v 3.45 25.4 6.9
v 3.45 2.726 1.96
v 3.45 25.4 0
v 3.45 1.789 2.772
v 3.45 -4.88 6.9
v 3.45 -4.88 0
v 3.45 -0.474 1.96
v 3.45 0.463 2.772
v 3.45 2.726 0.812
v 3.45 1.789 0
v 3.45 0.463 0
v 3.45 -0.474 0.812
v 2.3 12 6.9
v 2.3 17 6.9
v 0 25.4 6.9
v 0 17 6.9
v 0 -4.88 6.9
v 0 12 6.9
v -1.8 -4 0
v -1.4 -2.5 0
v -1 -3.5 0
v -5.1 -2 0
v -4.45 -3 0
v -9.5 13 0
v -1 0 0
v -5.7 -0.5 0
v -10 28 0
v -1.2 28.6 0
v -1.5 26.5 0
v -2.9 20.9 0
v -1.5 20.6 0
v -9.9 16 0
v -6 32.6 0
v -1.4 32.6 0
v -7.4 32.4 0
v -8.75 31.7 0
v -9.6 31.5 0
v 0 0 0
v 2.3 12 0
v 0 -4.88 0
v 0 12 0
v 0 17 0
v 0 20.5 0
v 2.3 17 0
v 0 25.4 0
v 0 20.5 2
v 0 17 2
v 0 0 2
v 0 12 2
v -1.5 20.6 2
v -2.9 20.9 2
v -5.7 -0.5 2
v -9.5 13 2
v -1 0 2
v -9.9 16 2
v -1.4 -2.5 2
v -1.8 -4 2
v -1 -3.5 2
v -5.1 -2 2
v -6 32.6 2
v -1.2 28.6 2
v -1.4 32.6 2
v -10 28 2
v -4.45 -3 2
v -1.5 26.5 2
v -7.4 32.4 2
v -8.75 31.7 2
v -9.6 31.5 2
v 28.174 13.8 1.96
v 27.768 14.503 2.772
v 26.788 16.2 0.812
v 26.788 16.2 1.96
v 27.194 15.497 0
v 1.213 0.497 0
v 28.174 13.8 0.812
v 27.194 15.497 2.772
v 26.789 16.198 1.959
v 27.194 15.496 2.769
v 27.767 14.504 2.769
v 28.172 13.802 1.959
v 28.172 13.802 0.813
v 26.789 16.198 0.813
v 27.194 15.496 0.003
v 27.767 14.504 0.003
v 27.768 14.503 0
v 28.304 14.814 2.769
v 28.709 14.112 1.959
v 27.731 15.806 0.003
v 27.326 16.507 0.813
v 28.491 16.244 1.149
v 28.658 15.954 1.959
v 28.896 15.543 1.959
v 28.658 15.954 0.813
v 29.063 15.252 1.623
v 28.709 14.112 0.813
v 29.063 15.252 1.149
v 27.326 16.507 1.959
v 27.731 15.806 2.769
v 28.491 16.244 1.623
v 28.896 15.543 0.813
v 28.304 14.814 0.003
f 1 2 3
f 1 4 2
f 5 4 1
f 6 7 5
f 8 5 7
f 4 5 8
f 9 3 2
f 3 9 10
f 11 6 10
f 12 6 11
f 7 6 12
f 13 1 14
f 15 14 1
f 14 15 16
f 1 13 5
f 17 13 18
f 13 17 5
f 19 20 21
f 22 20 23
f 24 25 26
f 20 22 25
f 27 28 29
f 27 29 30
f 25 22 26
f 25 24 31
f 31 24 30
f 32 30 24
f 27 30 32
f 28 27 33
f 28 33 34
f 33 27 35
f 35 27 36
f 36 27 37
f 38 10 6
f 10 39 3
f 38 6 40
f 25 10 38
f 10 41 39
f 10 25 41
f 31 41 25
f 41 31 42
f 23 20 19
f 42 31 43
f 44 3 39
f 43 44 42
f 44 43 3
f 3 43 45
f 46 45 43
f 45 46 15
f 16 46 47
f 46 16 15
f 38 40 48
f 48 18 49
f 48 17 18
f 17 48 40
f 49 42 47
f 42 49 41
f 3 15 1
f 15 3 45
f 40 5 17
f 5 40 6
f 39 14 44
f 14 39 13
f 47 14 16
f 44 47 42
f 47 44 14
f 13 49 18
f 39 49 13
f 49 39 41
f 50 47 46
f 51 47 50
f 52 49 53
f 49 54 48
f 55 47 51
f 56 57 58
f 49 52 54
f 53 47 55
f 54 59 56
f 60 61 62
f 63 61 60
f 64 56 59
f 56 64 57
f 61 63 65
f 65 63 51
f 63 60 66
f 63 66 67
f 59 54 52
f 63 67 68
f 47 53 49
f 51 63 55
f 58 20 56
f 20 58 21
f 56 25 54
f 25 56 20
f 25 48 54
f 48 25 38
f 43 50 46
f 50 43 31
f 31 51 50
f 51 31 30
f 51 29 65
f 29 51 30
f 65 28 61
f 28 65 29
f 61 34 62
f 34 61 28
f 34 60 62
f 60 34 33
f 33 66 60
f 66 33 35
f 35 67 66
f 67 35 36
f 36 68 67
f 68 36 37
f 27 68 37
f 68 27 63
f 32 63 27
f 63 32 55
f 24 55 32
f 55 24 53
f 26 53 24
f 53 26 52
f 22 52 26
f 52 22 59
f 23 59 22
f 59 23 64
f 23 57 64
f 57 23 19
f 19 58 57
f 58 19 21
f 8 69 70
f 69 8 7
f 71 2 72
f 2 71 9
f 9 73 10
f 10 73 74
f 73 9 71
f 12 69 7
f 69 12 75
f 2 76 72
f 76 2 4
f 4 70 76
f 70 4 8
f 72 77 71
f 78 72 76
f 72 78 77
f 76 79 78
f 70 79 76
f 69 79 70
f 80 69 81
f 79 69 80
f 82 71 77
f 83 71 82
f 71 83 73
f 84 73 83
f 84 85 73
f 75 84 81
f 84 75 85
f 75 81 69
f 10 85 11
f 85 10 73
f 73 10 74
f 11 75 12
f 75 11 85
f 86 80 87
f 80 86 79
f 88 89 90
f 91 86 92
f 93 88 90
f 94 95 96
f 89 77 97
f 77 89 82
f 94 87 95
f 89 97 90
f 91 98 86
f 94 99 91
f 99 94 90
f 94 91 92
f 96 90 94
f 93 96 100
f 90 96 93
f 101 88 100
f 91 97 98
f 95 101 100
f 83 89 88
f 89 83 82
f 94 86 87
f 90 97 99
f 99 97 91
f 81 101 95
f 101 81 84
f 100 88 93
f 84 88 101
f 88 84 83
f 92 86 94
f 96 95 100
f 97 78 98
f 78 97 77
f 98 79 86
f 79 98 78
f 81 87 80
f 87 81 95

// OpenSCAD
// WallControl Fixture Generator

/*
    Note on coordinates. Unless otherwiser noted, all models are designed with the pegboard
    face as the zy plane, and the x axis aligned to the bottom left edge of the slot and
    pointing away from the wall. These are then rotated for optimal printing.
    TODO: Verify
 */

ITEM = "shelf"; // [shelf, holder, bin, hook]
SPACES = 1;  // [1:8]
DEPTH = 25; // [200];

module __Customizer_Limit__ () {}

// Basic Dimensions
INCH = 25.4;
SLOT_WIDTH = 2.5;
SLOT_HEIGHT = 25.4;
SLOT_SPACING = 1*INCH;
SLOT_VERTICAL_SPACING = 2*INCH;
SHELF_THICKNESS = 1.6;

MOUNT_CONNECTOR_HEIGHT = 20;

TOLERANCE = 0.2;
THICKNESS = 1.6;
BEVEL = 2.4;
SLOP = 0.001;

//SUPPORT_HEIGHT = SLOT_VERTICAL_SPACING - TOLERANCE;
SUPPORT_HEIGHT = SLOT_VERTICAL_SPACING*0.6 - TOLERANCE;
SUPPORT_THICKNESS = SLOT_WIDTH - TOLERANCE;

SUPPORT_BASE_SOCKET_HEIGHT = 5;
SOCKET_TOP_OFFSET = 3; // offset of top of pin from top of mount connector.
MAX_SOCKET_OFFSET = 14;
SUPPORT_BOTTOM_OFFSET = SUPPORT_HEIGHT-SLOT_HEIGHT;

SUPPORT_BLOCK_SIZE = [SUPPORT_THICKNESS*1.5, SUPPORT_HEIGHT, SUPPORT_THICKNESS*3];
PIN_SIZE = [SUPPORT_THICKNESS, SUPPORT_BASE_SOCKET_HEIGHT, SUPPORT_THICKNESS*4];

// Distribute items with given size over a specific span, returning the number of items
function distribution_count(size, gap, span) =
    floor((span + gap) / (size + gap));

// Distribute items with given size over a specific span, returning the offset of the first item
function distribution_offset(size, gap, span) =
    (span - (distribution_count(size, gap, span) * (size + gap) - gap)) / 2;

function sum(v) = [for (p=v) 1]*v;

/*
    Create a beveled block; parameters are the same as cube(), with the addition of a bevel.
    TODO: Allow bevels on different axes to be different by passing array
 */
module beveled_block(size, bevel=THICKNESS/4, center=false) {
    base_size = size - [2*bevel,2*bevel,2*bevel];
    offset = (center==true) ? [0,0,0] : size/2;
    echo(offset=offset);
    translate(offset) hull() {
        cube([size.x, base_size.y, base_size.z], center=true);
        cube([base_size.x, size.y, base_size.z], center=true);
        cube([base_size.x, base_size.y, size.z], center=true);
     }
}
/*
    Wallcontrol mount
 */
module wallcontrol_mount() {
    linear_extrude(2.0) polygon([
        // Supporting hook & connection surface
            [-1.8,-4],[-1.0,-3.5],[-1.4,-2.5],[-1.0,0],[0,0],[0,20.5],
        // Bottom hook
            [-1.5,20.6],[-2.9,20.9],[-1.5,26.5],[-1.2,28.6],[-1.4,32.6],
        // Bottom curve & Back
            [-6.0,32.6],[-7.4,32.4],[-8.75,31.7],[-9.6,31.5],[-10,28],
        // top tab
            [-9.9,16],[-9.5,13],[-5.7,-0.5],[-5.1,-2],[-4.45,-3]]);
}

/*
    Basic WallControll support block with mount and pin socket.

    socket_offset - height of pin socket below the top of the mount connector. Should be
        at least a few mm to prevent the support block from breaking off the mount at the
        top. A higher position (lesss offset) is generally better, as the force on the
        mount will be directed more downward. Sometimes, a better look can be achieved
        with a larger offset setting. Defaults is a few mm below the top of the mount
        connection.
    extra_length - amount of extra length to add to the bottom of the support. This is
        typcially used with a brace, but can be used to create vertically oriented
        fixtures.
 */
module support(socket_offset=SOCKET_TOP_OFFSET, depth=0, extra_length=0) {
    // support mount//    mount_offset = 8.75;
    ////    SUPPORT_THICKNESS = SLOT_WIDTH - TOLERANCE;
    ////    slide_length = BIN_DEPTH - 2*BEVEL;
    //mirror([0,1,0]) rotate([0,90,0]) translate([-8.1099,11,0]) import("WallControlMount2.stl");
    wallcontrol_mount();
    pin_y_offset = MOUNT_CONNECTOR_HEIGHT-PIN_SIZE.y-socket_offset;

    size = SUPPORT_BLOCK_SIZE + [0,extra_length,0];
    // support base
    difference() {
        translate([0,-SUPPORT_BOTTOM_OFFSET-extra_length,0]) cube(size);
        translate([0,pin_y_offset,-TOLERANCE]) cube(PIN_SIZE);
    }
}

/*
    Create a triangular brace of the given size
 */
module brace(size) {
    t = THICKNESS;
    a = atan((size.x-2*THICKNESS) / (size.y-THICKNESS));
    echo(a=a);
    inner_triangle = [[2*THICKNESS,-THICKNESS],[2*THICKNESS,-size.y+t/sin(a)],[size.x-t/cos(a),-t]];
    difference() {
        linear_extrude(height=size.z) {
            polygon([[0,0],[0,-size.y],[2*THICKNESS,-size.y],[size.x,-THICKNESS],[size.x,0]]);
        }
        if (inner_triangle[1].y < inner_triangle[0].y) {
            translate([0,0,SUPPORT_THICKNESS]) linear_extrude(height=size.z) polygon(inner_triangle);
        }
    }
}

/*
    Create a support braced on the bottom by an angled beam

    depth - how far out the brace comes from the support
    brace_height - height of brace. Increase for stronger support
 */
module braced_support(socket_offset=SOCKET_TOP_OFFSET, depth=10, brace_height=SUPPORT_BOTTOM_OFFSET, extra_support=0) {
    support(socket_offset=socket_offset, depth=depth, extra_length=extra_support);
    brace_size = [depth+SUPPORT_BLOCK_SIZE.x, brace_height+extra_support, SUPPORT_BLOCK_SIZE.z];
    brace(brace_size);
}

/**
 Creates a square array of square prisms that fit into a cube of the
 specified size. The prisms are parallel to the Z-axis. The bounding cube is
 centered on the z axis and rises up from the x/y plane.
*/
module mesh_cutter(size, hole_size=2, solid_size) {
    d = hole_size + solid_size;
    counts = [ for (i = [0,1]) distribution_count(hole_size, solid_size, size[i]) ];
    offsets = [ for (i = [0,1]) distribution_offset(hole_size, solid_size, size[i]) - size[i]/2 ];
    echo(size=hole_size, gap=solid_size, spans=size, counts=counts, offsets=offsets);
    echo(check_x=counts.x*hole_size + (counts.x-1)*solid_size + 2*offsets.x, check_y=counts.y*hole_size + (counts.y-1)*solid_size + 2*offsets.y);
    for (i = [0:(counts.x-1)]) {
        for (j = [0:(counts.y-1)]) {
            translate([offsets.x + d*i, offsets.y + d*j]) cube([hole_size, hole_size, size.z]);
        }
    }
}

/*
  Creates a support pin in the correct positon to fit the support

  Gadgets are attached to the support using a pin that fits in the socket
  on the support. These will typically come from the outside edge of the
  spport, allowing the gadget to be larger than the space between the
  supports.
 */
module support_pin(socket_offset=SOCKET_TOP_OFFSET) {
    pin_y_offset = MOUNT_CONNECTOR_HEIGHT-PIN_SIZE.y-socket_offset;
    pin_width = SUPPORT_BLOCK_SIZE.z+BEVEL;
    translate([0,pin_y_offset,-BEVEL]) {
        beveled_block([SUPPORT_THICKNESS-TOLERANCE, SUPPORT_BASE_SOCKET_HEIGHT-TOLERANCE, pin_width]);
    }
}

module simple_pin(socket_offset=SOCKET_TOP_OFFSET) {
    pin_y_offset = MOUNT_CONNECTOR_HEIGHT-PIN_SIZE.y-socket_offset -0.25*PIN_SIZE.y;
    pin_head_size = [SUPPORT_BLOCK_SIZE.x,PIN_SIZE.y*1.5,BEVEL];
    support_pin();
    translate([0,pin_y_offset,-pin_head_size.z]) cube(pin_head_size);
}

/*
    Creates a spacer to combine two specialty supports into a single
    structure that is fairly stable horizontally.

    spaces - number of spaces between the support slots
 */
module support_spacer(spaces=1, socket_offset=SOCKET_TOP_OFFSET) {
    echo(spaces=spaces);
    pin_y_offset = MOUNT_CONNECTOR_HEIGHT-PIN_SIZE.y-socket_offset;
    shoulder = THICKNESS;
    spacer_width = spaces*SLOT_SPACING - SLOT_WIDTH;
    spacer_size = [SUPPORT_THICKNESS-TOLERANCE,SUPPORT_BASE_SOCKET_HEIGHT-TOLERANCE+2*shoulder,spacer_width];

    translate([0,0,-spacer_size.z/2]) {
        translate([0,0,spacer_size.z/2]) support_pin(socket_offset=socket_offset);
        mirror([0,0,1]) translate([0,0,spacer_size.z/2]) support_pin(socket_offset=socket_offset);
        translate([0,pin_y_offset-shoulder,-spacer_size.z/2]) {
            cube(spacer_size);
        }
    }
}

module oriented_support_spacer(spaces=1, socket_offset=SOCKET_TOP_OFFSET) {
    rotate([0,-90,0]) support_spacer(spaces=spaces, socket_offset=socket_offset);
}

module oriented_ensemble() {
    translate([0.5*INCH-SLOT_WIDTH/2,0,0]) rotate([0,90,0]) support(1);
    mirror([1,0,0]) translate([0.5*INCH-SLOT_WIDTH/2,0,0]) rotate([0,90,0]) support(1);
    translate([0,-HEIGHT,LENGTH/2+THICKNESS]) rotate([0,0,0]) basic_tray([LENGTH,WIDTH,HEIGHT]);
}

/*
    Creates a tool holder - basically, a rectangular ring that has pins for
    adding suppports.

    Requires two standard supports, one mirrored.

    spaces - number of spaces between support slots
    depth - how far the tool holder extends from the supports
 */
module tool_holder(spaces, depth) {
    holder_thickness = 2*THICKNESS;
    holder_height = SUPPORT_BASE_SOCKET_HEIGHT-TOLERANCE;
    size=[depth, spaces*SLOT_SPACING-SLOT_WIDTH-2*holder_thickness];
    bevel = THICKNESS/4;
    translate([0,holder_height/2,0]) difference() {
        beveled_block([size.x+2*holder_thickness, holder_height, size.y+2*holder_thickness], center=true);
        cube([size.x, holder_height*2, size.y], center=true);
        translate([0,holder_height-bevel,0]) beveled_block([size.x+2*bevel, holder_height, size.y+2*bevel], center=true);
        //translate([0,-holder_height+bevel,0]) beveled_block([size.x+2*bevel, holder_height, size.y+2*bevel], center=true);
    }

    support_size = [SUPPORT_THICKNESS-TOLERANCE, holder_height,size.y+SUPPORT_THICKNESS*8];
    translate([support_size.x/2-size.x/2-holder_thickness,support_size.y/2,0]) {
        beveled_block(support_size, center=true);
        translate([(holder_thickness-support_size.x)/2,support_size.y,0]) cube([holder_thickness, support_size.y*2, size.y+2*holder_thickness], center=true);
    }
}

/*
    Creates a shelf, optionally, with a lip to keep items contained.

    Requires two standard supports, one mirrored.

    spaces - number of spaces between support slots. The shelf will extensd beyond this for
                half a space, allowing for continuous shelving
    depth - how far the shelf extends from the supports
    lip_height - height of lip, or 0 for no lip

    TODO: allow exact shelf size and calculate spacing
 */
module shelf(spaces, depth, lip_height=0) {
    thickness = THICKNESS;
    height = SUPPORT_BASE_SOCKET_HEIGHT-TOLERANCE;
    shelf_thickness = thickness + lip_height;
    size=[depth, spaces*(SLOT_SPACING+1)-TOLERANCE];
    bevel = THICKNESS/4;

    // create the basic shelf slab
    translate([0,0,-(size.y+SLOT_SPACING)/2]) {
        difference() {
            beveled_block([size.x, shelf_thickness, size.y+SLOT_SPACING]);
            translate([thickness*3,0,thickness]) cube([size.x-4*thickness, lip_height, size.y+SLOT_SPACING-2*thickness]);
            gap_length = spaces*SLOT_SPACING+SLOT_WIDTH;
            translate([0,0,(size.y+SLOT_SPACING)/2-gap_length/2]) cube([thickness*2+3*TOLERANCE,shelf_thickness,gap_length]);
        }
    }
    //translate([-size.x/2+thickness*1.5,shelf_thickness/2,0]) cube([SUPPORT_THICKNESS*1.5, shelf_thickness, size.y], center=true);

    // create pins for adding supports
    support_size = [SUPPORT_THICKNESS-TOLERANCE, height, SLOT_SPACING/2+SLOT_WIDTH/2+TOLERANCE+3*thickness];
    translate([support_size.x/2,shelf_thickness-height/2,-(size.y+SLOT_SPACING)/2+support_size.z/2]) beveled_block(support_size, center=true);
    translate([support_size.x/2,shelf_thickness-height/2,+(size.y+SLOT_SPACING)/2-support_size.z/2]) beveled_block(support_size, center=true);
    //-(size.y+SLOT_SPACING-2*thickness)/2-
    echo(spaces=spaces, SLOT_SPACING=SLOT_SPACING, SLOT_WIDTH=SLOT_WIDTH, offset=-(spaces*SLOT_SPACING/2+SLOT_WIDTH/2));
    //translate([-1.5,-12,-(spaces*SLOT_SPACING/2)-SLOT_WIDTH/2]) cube([1.5,25,SLOT_WIDTH]);
    //translate([-1.5,-12,+(spaces*SLOT_SPACING/2)-SLOT_WIDTH/2]) cube([1.5,25,SLOT_WIDTH]);
}

module supports(depth= 0) {
    translate([-17,12,0]) support(socket_offset = SOCKET_OFFSET, depth = 0);
    translate([-25,12,0]) mirror([1, 0, 0]) support(socket_offset = SOCKET_OFFSET, depth = 0);
}

module hook(depth=10, lip=4, shelf_thickness=0, extra_support=0) {
    stop_width = THICKNESS;
    braced_support(socket_offset=MAX_SOCKET_OFFSET, depth=depth, extra_support=extra_support);

    // end stop
    translate([depth+SUPPORT_BLOCK_SIZE.x-THICKNESS,0,0]) cube([stop_width,lip,SUPPORT_BLOCK_SIZE.z]);
}

module legacy_mini_shelf_support() {
    stop_size = 3;
    shelf_size = [82.6,5.7,8*INCH];
    hook(depth=shelf_size.x+THICKNESS+TOLERANCE, lip=stop_size, shelf_thickness=shelf_size.y, extra_support=8);
    translate([SUPPORT_BLOCK_SIZE.x,shelf_size.y+TOLERANCE,0]) cube([stop_size,THICKNESS,SUPPORT_BLOCK_SIZE.z]);
}

module mirror_pair() {
    translate([2,0,0]) children();
    mirror([1,0,0]) translate([2,0,0]) children();
}

module spacer(spaces=1) {
    oriented_support_spacer(spaces=spaces);
}

module oriented_shelf(spaces, depth, lip_height=0) {
    translate([depth*1/2,0,0]) rotate([90,0,0]) shelf(spaces, depth, lip_height);
}

module oriented_tool_holder(spaces, depth) {
    rotate([90,0,0]) tool_holder(spaces, depth);
}

module complete_legacy_mini_shelf_support() {
    translate([-34,0,0]) rotate([0,0,-90]) legacy_mini_shelf_support();
    translate([0,-18,0]) mirror([1,0,0]) rotate([0,0,-90]) legacy_mini_shelf_support();
    //rotate([0,0,-90]) translate([0,-14.5,0]) spacer(spaces=6);
}

module round_hook(d=3, length=30) {
//    side = (d/2) * 2 / (sqrt(4 + 2*sqrt(2)));
    side = (d/2) * 2 / (sqrt(4 + 2*sqrt(2)));
    z_offset = side * (1 /2+ 1/sqrt(2));
    support(depth=0);
    translate([d/2,0,z_offset]) rotate([0,90,30]) rotate([0,0,45/2]) {
        cylinder(r=d/2, h=length, $fn=8);
        translate([0,0,length]) sphere(r=1.08*d/2, $fn=8);
    }
}


//support_pin();
//oriented_ensemble();
//braced_support(extra_support=10, depth=40);
//tool_holder(spaces=1,depth=40);
//oriented_shelf(spaces=1, depth=30, lip_height=1);
//complete_legacy_mini_shelf_support();
round_hook();
//simple_pin();
